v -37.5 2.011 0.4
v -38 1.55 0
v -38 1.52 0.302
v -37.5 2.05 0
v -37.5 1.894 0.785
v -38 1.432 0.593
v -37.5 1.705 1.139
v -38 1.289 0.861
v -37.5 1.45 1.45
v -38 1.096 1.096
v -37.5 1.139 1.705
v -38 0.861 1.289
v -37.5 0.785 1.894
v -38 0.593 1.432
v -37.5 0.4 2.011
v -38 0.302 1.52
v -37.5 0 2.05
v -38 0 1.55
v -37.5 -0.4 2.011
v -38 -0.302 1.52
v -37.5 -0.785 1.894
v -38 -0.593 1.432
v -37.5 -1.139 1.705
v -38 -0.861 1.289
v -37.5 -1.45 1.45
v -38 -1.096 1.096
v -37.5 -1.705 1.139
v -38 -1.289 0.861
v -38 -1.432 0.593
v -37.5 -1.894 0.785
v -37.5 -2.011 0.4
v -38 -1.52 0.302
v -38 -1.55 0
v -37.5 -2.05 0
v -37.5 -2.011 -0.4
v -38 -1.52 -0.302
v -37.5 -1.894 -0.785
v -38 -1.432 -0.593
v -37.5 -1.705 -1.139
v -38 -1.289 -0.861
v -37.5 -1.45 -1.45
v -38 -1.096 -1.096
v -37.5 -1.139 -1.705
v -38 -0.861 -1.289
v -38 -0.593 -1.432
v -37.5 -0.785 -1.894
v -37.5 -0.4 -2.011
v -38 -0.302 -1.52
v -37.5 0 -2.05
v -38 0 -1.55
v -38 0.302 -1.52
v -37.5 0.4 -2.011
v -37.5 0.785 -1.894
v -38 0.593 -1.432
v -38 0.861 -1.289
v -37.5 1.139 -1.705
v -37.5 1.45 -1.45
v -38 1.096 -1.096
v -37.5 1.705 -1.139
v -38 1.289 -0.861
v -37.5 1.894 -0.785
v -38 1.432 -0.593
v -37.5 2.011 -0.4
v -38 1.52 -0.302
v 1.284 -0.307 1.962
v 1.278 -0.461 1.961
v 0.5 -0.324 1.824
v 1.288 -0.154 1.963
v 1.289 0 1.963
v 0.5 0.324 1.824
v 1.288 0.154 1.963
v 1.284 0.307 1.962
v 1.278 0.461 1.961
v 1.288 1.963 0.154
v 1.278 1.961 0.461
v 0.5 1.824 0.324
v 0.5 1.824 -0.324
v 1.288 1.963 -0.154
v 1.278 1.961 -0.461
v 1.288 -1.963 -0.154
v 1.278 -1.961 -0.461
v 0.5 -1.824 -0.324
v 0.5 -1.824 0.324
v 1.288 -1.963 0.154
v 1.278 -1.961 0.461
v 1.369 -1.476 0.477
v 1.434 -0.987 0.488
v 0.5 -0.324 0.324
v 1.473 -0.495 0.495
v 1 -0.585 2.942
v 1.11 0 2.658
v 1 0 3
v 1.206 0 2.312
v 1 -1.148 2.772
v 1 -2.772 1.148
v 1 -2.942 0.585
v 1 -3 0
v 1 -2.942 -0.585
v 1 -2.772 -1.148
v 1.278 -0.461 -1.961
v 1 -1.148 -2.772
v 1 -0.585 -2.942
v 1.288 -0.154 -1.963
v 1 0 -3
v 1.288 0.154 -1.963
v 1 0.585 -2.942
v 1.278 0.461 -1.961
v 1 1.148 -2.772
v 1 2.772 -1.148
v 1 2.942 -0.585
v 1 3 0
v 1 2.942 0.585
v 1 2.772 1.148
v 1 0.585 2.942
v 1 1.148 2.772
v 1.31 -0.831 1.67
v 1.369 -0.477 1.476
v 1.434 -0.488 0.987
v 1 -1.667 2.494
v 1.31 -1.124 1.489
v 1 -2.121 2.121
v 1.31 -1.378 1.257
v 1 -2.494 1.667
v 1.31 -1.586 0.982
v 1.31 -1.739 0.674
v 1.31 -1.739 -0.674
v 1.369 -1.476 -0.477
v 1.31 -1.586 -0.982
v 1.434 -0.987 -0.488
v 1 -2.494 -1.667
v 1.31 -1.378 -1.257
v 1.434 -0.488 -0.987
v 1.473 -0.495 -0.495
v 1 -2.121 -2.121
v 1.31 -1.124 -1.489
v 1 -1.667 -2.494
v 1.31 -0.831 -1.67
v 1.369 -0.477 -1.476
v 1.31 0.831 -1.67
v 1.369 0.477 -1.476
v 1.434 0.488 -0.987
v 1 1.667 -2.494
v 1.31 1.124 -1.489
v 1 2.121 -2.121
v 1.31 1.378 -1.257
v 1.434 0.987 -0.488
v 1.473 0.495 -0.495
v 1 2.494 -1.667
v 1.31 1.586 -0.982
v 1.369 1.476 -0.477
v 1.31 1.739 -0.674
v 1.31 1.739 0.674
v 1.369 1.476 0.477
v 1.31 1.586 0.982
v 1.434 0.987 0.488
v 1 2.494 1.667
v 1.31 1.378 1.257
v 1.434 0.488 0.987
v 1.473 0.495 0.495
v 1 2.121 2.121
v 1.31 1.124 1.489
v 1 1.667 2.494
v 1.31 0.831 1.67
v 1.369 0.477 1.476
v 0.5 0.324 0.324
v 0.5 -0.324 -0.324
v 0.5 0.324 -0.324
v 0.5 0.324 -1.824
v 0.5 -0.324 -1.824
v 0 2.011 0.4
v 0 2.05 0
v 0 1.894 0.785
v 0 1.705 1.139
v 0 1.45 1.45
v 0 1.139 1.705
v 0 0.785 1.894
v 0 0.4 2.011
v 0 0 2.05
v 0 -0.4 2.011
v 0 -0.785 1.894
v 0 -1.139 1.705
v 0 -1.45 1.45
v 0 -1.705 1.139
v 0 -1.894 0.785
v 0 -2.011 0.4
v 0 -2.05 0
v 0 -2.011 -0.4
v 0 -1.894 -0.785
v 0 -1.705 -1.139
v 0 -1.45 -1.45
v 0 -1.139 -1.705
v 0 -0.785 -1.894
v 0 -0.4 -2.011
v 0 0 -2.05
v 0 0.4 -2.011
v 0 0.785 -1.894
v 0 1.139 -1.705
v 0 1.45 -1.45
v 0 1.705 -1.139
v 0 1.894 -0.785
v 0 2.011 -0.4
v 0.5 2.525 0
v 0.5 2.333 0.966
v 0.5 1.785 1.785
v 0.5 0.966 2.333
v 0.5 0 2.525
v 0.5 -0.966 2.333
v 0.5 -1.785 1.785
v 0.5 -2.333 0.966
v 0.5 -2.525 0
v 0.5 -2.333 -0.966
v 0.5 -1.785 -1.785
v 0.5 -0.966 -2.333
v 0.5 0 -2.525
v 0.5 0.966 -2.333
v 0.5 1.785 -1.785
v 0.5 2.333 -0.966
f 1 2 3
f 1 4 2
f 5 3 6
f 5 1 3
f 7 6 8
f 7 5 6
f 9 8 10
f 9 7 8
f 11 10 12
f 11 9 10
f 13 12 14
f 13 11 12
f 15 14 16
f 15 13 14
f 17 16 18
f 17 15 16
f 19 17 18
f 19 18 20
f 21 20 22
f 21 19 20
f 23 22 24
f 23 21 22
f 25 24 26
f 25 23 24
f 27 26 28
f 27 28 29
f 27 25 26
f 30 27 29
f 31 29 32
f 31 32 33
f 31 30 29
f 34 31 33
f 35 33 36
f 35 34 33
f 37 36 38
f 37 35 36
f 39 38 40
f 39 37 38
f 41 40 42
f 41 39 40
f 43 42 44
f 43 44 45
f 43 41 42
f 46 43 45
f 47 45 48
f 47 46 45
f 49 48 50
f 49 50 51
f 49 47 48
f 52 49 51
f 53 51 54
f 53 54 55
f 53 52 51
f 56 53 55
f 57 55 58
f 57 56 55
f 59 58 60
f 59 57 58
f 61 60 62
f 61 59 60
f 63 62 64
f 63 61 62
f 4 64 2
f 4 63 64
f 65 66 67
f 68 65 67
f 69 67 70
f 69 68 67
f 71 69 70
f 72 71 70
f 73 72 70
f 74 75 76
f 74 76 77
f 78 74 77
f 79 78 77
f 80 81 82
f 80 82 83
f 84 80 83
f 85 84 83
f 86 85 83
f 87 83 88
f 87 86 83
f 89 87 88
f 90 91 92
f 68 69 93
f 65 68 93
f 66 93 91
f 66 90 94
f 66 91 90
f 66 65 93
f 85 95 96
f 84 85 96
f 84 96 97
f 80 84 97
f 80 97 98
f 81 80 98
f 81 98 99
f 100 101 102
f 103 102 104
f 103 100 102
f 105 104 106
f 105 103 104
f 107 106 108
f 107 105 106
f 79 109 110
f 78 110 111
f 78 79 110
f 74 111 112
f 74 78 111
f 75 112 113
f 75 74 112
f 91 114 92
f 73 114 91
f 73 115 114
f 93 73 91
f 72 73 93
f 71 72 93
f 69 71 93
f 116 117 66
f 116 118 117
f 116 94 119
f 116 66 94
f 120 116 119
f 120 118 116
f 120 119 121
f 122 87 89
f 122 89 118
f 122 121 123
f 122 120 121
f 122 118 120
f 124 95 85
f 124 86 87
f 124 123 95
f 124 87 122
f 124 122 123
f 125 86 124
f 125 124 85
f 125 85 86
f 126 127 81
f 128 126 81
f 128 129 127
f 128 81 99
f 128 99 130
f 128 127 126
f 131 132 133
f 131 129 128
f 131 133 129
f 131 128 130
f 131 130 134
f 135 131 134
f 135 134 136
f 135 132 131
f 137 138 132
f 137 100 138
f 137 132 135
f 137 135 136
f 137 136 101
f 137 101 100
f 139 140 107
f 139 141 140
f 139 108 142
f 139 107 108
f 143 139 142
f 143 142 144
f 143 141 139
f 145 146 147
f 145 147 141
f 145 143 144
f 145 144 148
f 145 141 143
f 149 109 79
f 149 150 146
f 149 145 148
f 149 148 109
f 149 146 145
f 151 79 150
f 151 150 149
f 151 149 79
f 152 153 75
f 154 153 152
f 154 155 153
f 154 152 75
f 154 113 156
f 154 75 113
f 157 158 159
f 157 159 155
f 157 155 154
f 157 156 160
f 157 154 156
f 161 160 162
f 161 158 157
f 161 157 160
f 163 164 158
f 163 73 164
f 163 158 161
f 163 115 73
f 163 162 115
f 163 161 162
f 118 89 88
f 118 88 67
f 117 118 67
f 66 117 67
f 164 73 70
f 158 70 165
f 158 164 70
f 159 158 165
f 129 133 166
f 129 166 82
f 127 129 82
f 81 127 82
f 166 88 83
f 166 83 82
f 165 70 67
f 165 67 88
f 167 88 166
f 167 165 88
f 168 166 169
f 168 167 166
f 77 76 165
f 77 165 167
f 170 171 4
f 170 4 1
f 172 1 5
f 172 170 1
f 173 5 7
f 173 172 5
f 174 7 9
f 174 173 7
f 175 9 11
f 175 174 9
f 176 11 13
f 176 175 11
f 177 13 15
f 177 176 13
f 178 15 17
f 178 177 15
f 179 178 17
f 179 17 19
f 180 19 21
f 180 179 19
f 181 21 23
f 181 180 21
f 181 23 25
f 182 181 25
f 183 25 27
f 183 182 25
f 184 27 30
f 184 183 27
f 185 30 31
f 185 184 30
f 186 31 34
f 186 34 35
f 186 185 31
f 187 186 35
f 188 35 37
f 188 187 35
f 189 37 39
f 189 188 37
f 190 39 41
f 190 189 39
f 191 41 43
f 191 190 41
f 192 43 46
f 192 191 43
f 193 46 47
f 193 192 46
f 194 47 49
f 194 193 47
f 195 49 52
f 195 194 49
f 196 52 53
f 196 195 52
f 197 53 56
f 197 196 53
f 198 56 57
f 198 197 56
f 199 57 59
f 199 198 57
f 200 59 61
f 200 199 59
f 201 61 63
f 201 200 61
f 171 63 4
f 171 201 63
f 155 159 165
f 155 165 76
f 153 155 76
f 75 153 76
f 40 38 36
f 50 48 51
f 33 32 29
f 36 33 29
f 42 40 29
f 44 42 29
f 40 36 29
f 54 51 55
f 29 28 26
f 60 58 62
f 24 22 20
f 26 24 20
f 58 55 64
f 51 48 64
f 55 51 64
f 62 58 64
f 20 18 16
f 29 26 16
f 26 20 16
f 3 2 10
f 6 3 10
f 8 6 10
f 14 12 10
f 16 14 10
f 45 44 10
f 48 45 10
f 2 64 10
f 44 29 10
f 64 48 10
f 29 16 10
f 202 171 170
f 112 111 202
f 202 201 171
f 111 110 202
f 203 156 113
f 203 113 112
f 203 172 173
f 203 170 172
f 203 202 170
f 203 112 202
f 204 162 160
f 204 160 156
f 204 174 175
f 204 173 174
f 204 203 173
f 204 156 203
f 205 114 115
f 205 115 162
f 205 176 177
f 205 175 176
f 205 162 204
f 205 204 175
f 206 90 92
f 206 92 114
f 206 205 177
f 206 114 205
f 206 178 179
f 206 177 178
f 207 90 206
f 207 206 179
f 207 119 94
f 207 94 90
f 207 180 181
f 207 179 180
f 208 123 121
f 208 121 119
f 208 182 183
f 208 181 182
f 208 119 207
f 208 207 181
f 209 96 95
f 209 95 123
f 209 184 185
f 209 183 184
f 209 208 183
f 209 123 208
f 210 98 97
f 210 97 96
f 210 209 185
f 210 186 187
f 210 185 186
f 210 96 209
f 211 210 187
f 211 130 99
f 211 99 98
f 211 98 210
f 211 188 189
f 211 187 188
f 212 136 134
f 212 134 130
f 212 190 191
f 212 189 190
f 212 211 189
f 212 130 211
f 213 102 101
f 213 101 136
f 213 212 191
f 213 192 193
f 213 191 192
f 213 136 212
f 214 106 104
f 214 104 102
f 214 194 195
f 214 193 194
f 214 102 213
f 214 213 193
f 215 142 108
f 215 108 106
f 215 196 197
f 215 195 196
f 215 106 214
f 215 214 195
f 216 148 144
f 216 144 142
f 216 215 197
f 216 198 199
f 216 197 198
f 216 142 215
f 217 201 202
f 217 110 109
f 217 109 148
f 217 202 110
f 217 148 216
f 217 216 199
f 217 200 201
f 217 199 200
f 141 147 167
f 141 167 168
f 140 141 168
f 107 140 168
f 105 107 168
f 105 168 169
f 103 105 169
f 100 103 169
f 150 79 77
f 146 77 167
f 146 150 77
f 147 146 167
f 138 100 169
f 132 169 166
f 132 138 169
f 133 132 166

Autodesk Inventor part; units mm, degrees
ref_plane "YZ Plane" through (0, 0, 0) normal (1, 0, 0) x (0, 1, 0)
ref_plane "XZ Plane" through (0, 0, 0) normal (0, 1, 0) x (-1, 0, 0)
sketch "Sketch1" plane through (0, 0, 0) normal (1, 0, 0) x (0, 1, 0)
  circle A0 centre (0, 0) radius 2.05
  dimension "d0" = 4.1
extrude "Extrusion1" add sketch "Sketch1" against normal blind 38
ref_plane "Work Plane1" through (1, 0, 0) normal (1, 0, 0) x (0, 0, -1)
sketch "Sketch2" plane through (1, 0, 0) normal (1, 0, 0) x (0, 0, -1)
  circle A0 centre (0, 0) radius 3
  dimension "d4" = 6
loft "Loft1" add profiles "Sketch2" section 1 edges at (0, -2.05, 0)
sketch "Sketch3" plane through (0, 0, 0) normal (0, 1, 0) x (-1, 0, 0)
  line L0 (-1, -3) -> (-1, 3) projected
  line L1 (-1, 3) -> (-1, 0)
  line L2 (-1, 0) -> (-1.5, 0)
  arc A0 (-1, 3) -> (-1.5, 0) centre (7.75, 0) ccw
  point P0 (0, 0)
  dimension "d9" = 0.5
revolve "Revolution1" add sketch "Sketch3" angle 360 about axis through (1, 0, 0) along (1, 0, 0)
ref_plane "Work Plane2" through (1.5, 0, 0) normal (1, 0, 0) x (0, 0, -1)
sketch "Sketch4" plane through (1.5, 0, 0) normal (1, 0, 0) x (0, 0, -1)
  line L0 (2, 0.5) -> (2, -0.5)
  line L1 (-2, -0.5) -> (-2, 0.5)
  line L2 (-0.5, 2) -> (0.5, 2)
  line L3 (0.5, -2) -> (-0.5, -2)
  line L4 (2, -0.5) -> (0.5, -0.5)
  line L5 (-0.5, -0.5) -> (-2, -0.5)
  line L6 (-0.5, -2) -> (-0.5, -0.5)
  line L7 (-0.5, 0.5) -> (-0.5, 2)
  line L8 (-2, 0.5) -> (-0.5, 0.5)
  line L9 (0.5, 0.5) -> (2, 0.5)
  line L10 (0.5, 2) -> (0.5, 0.5)
  line L11 (0.5, -0.5) -> (0.5, -2)
  dimension "d12" = 4
  dimension "d13" = 1
  dimension "d14" = 1
  dimension "d15" = 4
extrude "Extrusion2" cut sketch "Sketch4" against normal blind 1 draft -10
chamfer "Chamfer1" distance 0.5 angle 45 1 edges at (-38, -2.05, 0)
thread "Thread1" size "M4.5x0.75" class "6g" standard "ANSI Metric M Profile" length 15
properties part number "Parafuso do Braço (2)"
